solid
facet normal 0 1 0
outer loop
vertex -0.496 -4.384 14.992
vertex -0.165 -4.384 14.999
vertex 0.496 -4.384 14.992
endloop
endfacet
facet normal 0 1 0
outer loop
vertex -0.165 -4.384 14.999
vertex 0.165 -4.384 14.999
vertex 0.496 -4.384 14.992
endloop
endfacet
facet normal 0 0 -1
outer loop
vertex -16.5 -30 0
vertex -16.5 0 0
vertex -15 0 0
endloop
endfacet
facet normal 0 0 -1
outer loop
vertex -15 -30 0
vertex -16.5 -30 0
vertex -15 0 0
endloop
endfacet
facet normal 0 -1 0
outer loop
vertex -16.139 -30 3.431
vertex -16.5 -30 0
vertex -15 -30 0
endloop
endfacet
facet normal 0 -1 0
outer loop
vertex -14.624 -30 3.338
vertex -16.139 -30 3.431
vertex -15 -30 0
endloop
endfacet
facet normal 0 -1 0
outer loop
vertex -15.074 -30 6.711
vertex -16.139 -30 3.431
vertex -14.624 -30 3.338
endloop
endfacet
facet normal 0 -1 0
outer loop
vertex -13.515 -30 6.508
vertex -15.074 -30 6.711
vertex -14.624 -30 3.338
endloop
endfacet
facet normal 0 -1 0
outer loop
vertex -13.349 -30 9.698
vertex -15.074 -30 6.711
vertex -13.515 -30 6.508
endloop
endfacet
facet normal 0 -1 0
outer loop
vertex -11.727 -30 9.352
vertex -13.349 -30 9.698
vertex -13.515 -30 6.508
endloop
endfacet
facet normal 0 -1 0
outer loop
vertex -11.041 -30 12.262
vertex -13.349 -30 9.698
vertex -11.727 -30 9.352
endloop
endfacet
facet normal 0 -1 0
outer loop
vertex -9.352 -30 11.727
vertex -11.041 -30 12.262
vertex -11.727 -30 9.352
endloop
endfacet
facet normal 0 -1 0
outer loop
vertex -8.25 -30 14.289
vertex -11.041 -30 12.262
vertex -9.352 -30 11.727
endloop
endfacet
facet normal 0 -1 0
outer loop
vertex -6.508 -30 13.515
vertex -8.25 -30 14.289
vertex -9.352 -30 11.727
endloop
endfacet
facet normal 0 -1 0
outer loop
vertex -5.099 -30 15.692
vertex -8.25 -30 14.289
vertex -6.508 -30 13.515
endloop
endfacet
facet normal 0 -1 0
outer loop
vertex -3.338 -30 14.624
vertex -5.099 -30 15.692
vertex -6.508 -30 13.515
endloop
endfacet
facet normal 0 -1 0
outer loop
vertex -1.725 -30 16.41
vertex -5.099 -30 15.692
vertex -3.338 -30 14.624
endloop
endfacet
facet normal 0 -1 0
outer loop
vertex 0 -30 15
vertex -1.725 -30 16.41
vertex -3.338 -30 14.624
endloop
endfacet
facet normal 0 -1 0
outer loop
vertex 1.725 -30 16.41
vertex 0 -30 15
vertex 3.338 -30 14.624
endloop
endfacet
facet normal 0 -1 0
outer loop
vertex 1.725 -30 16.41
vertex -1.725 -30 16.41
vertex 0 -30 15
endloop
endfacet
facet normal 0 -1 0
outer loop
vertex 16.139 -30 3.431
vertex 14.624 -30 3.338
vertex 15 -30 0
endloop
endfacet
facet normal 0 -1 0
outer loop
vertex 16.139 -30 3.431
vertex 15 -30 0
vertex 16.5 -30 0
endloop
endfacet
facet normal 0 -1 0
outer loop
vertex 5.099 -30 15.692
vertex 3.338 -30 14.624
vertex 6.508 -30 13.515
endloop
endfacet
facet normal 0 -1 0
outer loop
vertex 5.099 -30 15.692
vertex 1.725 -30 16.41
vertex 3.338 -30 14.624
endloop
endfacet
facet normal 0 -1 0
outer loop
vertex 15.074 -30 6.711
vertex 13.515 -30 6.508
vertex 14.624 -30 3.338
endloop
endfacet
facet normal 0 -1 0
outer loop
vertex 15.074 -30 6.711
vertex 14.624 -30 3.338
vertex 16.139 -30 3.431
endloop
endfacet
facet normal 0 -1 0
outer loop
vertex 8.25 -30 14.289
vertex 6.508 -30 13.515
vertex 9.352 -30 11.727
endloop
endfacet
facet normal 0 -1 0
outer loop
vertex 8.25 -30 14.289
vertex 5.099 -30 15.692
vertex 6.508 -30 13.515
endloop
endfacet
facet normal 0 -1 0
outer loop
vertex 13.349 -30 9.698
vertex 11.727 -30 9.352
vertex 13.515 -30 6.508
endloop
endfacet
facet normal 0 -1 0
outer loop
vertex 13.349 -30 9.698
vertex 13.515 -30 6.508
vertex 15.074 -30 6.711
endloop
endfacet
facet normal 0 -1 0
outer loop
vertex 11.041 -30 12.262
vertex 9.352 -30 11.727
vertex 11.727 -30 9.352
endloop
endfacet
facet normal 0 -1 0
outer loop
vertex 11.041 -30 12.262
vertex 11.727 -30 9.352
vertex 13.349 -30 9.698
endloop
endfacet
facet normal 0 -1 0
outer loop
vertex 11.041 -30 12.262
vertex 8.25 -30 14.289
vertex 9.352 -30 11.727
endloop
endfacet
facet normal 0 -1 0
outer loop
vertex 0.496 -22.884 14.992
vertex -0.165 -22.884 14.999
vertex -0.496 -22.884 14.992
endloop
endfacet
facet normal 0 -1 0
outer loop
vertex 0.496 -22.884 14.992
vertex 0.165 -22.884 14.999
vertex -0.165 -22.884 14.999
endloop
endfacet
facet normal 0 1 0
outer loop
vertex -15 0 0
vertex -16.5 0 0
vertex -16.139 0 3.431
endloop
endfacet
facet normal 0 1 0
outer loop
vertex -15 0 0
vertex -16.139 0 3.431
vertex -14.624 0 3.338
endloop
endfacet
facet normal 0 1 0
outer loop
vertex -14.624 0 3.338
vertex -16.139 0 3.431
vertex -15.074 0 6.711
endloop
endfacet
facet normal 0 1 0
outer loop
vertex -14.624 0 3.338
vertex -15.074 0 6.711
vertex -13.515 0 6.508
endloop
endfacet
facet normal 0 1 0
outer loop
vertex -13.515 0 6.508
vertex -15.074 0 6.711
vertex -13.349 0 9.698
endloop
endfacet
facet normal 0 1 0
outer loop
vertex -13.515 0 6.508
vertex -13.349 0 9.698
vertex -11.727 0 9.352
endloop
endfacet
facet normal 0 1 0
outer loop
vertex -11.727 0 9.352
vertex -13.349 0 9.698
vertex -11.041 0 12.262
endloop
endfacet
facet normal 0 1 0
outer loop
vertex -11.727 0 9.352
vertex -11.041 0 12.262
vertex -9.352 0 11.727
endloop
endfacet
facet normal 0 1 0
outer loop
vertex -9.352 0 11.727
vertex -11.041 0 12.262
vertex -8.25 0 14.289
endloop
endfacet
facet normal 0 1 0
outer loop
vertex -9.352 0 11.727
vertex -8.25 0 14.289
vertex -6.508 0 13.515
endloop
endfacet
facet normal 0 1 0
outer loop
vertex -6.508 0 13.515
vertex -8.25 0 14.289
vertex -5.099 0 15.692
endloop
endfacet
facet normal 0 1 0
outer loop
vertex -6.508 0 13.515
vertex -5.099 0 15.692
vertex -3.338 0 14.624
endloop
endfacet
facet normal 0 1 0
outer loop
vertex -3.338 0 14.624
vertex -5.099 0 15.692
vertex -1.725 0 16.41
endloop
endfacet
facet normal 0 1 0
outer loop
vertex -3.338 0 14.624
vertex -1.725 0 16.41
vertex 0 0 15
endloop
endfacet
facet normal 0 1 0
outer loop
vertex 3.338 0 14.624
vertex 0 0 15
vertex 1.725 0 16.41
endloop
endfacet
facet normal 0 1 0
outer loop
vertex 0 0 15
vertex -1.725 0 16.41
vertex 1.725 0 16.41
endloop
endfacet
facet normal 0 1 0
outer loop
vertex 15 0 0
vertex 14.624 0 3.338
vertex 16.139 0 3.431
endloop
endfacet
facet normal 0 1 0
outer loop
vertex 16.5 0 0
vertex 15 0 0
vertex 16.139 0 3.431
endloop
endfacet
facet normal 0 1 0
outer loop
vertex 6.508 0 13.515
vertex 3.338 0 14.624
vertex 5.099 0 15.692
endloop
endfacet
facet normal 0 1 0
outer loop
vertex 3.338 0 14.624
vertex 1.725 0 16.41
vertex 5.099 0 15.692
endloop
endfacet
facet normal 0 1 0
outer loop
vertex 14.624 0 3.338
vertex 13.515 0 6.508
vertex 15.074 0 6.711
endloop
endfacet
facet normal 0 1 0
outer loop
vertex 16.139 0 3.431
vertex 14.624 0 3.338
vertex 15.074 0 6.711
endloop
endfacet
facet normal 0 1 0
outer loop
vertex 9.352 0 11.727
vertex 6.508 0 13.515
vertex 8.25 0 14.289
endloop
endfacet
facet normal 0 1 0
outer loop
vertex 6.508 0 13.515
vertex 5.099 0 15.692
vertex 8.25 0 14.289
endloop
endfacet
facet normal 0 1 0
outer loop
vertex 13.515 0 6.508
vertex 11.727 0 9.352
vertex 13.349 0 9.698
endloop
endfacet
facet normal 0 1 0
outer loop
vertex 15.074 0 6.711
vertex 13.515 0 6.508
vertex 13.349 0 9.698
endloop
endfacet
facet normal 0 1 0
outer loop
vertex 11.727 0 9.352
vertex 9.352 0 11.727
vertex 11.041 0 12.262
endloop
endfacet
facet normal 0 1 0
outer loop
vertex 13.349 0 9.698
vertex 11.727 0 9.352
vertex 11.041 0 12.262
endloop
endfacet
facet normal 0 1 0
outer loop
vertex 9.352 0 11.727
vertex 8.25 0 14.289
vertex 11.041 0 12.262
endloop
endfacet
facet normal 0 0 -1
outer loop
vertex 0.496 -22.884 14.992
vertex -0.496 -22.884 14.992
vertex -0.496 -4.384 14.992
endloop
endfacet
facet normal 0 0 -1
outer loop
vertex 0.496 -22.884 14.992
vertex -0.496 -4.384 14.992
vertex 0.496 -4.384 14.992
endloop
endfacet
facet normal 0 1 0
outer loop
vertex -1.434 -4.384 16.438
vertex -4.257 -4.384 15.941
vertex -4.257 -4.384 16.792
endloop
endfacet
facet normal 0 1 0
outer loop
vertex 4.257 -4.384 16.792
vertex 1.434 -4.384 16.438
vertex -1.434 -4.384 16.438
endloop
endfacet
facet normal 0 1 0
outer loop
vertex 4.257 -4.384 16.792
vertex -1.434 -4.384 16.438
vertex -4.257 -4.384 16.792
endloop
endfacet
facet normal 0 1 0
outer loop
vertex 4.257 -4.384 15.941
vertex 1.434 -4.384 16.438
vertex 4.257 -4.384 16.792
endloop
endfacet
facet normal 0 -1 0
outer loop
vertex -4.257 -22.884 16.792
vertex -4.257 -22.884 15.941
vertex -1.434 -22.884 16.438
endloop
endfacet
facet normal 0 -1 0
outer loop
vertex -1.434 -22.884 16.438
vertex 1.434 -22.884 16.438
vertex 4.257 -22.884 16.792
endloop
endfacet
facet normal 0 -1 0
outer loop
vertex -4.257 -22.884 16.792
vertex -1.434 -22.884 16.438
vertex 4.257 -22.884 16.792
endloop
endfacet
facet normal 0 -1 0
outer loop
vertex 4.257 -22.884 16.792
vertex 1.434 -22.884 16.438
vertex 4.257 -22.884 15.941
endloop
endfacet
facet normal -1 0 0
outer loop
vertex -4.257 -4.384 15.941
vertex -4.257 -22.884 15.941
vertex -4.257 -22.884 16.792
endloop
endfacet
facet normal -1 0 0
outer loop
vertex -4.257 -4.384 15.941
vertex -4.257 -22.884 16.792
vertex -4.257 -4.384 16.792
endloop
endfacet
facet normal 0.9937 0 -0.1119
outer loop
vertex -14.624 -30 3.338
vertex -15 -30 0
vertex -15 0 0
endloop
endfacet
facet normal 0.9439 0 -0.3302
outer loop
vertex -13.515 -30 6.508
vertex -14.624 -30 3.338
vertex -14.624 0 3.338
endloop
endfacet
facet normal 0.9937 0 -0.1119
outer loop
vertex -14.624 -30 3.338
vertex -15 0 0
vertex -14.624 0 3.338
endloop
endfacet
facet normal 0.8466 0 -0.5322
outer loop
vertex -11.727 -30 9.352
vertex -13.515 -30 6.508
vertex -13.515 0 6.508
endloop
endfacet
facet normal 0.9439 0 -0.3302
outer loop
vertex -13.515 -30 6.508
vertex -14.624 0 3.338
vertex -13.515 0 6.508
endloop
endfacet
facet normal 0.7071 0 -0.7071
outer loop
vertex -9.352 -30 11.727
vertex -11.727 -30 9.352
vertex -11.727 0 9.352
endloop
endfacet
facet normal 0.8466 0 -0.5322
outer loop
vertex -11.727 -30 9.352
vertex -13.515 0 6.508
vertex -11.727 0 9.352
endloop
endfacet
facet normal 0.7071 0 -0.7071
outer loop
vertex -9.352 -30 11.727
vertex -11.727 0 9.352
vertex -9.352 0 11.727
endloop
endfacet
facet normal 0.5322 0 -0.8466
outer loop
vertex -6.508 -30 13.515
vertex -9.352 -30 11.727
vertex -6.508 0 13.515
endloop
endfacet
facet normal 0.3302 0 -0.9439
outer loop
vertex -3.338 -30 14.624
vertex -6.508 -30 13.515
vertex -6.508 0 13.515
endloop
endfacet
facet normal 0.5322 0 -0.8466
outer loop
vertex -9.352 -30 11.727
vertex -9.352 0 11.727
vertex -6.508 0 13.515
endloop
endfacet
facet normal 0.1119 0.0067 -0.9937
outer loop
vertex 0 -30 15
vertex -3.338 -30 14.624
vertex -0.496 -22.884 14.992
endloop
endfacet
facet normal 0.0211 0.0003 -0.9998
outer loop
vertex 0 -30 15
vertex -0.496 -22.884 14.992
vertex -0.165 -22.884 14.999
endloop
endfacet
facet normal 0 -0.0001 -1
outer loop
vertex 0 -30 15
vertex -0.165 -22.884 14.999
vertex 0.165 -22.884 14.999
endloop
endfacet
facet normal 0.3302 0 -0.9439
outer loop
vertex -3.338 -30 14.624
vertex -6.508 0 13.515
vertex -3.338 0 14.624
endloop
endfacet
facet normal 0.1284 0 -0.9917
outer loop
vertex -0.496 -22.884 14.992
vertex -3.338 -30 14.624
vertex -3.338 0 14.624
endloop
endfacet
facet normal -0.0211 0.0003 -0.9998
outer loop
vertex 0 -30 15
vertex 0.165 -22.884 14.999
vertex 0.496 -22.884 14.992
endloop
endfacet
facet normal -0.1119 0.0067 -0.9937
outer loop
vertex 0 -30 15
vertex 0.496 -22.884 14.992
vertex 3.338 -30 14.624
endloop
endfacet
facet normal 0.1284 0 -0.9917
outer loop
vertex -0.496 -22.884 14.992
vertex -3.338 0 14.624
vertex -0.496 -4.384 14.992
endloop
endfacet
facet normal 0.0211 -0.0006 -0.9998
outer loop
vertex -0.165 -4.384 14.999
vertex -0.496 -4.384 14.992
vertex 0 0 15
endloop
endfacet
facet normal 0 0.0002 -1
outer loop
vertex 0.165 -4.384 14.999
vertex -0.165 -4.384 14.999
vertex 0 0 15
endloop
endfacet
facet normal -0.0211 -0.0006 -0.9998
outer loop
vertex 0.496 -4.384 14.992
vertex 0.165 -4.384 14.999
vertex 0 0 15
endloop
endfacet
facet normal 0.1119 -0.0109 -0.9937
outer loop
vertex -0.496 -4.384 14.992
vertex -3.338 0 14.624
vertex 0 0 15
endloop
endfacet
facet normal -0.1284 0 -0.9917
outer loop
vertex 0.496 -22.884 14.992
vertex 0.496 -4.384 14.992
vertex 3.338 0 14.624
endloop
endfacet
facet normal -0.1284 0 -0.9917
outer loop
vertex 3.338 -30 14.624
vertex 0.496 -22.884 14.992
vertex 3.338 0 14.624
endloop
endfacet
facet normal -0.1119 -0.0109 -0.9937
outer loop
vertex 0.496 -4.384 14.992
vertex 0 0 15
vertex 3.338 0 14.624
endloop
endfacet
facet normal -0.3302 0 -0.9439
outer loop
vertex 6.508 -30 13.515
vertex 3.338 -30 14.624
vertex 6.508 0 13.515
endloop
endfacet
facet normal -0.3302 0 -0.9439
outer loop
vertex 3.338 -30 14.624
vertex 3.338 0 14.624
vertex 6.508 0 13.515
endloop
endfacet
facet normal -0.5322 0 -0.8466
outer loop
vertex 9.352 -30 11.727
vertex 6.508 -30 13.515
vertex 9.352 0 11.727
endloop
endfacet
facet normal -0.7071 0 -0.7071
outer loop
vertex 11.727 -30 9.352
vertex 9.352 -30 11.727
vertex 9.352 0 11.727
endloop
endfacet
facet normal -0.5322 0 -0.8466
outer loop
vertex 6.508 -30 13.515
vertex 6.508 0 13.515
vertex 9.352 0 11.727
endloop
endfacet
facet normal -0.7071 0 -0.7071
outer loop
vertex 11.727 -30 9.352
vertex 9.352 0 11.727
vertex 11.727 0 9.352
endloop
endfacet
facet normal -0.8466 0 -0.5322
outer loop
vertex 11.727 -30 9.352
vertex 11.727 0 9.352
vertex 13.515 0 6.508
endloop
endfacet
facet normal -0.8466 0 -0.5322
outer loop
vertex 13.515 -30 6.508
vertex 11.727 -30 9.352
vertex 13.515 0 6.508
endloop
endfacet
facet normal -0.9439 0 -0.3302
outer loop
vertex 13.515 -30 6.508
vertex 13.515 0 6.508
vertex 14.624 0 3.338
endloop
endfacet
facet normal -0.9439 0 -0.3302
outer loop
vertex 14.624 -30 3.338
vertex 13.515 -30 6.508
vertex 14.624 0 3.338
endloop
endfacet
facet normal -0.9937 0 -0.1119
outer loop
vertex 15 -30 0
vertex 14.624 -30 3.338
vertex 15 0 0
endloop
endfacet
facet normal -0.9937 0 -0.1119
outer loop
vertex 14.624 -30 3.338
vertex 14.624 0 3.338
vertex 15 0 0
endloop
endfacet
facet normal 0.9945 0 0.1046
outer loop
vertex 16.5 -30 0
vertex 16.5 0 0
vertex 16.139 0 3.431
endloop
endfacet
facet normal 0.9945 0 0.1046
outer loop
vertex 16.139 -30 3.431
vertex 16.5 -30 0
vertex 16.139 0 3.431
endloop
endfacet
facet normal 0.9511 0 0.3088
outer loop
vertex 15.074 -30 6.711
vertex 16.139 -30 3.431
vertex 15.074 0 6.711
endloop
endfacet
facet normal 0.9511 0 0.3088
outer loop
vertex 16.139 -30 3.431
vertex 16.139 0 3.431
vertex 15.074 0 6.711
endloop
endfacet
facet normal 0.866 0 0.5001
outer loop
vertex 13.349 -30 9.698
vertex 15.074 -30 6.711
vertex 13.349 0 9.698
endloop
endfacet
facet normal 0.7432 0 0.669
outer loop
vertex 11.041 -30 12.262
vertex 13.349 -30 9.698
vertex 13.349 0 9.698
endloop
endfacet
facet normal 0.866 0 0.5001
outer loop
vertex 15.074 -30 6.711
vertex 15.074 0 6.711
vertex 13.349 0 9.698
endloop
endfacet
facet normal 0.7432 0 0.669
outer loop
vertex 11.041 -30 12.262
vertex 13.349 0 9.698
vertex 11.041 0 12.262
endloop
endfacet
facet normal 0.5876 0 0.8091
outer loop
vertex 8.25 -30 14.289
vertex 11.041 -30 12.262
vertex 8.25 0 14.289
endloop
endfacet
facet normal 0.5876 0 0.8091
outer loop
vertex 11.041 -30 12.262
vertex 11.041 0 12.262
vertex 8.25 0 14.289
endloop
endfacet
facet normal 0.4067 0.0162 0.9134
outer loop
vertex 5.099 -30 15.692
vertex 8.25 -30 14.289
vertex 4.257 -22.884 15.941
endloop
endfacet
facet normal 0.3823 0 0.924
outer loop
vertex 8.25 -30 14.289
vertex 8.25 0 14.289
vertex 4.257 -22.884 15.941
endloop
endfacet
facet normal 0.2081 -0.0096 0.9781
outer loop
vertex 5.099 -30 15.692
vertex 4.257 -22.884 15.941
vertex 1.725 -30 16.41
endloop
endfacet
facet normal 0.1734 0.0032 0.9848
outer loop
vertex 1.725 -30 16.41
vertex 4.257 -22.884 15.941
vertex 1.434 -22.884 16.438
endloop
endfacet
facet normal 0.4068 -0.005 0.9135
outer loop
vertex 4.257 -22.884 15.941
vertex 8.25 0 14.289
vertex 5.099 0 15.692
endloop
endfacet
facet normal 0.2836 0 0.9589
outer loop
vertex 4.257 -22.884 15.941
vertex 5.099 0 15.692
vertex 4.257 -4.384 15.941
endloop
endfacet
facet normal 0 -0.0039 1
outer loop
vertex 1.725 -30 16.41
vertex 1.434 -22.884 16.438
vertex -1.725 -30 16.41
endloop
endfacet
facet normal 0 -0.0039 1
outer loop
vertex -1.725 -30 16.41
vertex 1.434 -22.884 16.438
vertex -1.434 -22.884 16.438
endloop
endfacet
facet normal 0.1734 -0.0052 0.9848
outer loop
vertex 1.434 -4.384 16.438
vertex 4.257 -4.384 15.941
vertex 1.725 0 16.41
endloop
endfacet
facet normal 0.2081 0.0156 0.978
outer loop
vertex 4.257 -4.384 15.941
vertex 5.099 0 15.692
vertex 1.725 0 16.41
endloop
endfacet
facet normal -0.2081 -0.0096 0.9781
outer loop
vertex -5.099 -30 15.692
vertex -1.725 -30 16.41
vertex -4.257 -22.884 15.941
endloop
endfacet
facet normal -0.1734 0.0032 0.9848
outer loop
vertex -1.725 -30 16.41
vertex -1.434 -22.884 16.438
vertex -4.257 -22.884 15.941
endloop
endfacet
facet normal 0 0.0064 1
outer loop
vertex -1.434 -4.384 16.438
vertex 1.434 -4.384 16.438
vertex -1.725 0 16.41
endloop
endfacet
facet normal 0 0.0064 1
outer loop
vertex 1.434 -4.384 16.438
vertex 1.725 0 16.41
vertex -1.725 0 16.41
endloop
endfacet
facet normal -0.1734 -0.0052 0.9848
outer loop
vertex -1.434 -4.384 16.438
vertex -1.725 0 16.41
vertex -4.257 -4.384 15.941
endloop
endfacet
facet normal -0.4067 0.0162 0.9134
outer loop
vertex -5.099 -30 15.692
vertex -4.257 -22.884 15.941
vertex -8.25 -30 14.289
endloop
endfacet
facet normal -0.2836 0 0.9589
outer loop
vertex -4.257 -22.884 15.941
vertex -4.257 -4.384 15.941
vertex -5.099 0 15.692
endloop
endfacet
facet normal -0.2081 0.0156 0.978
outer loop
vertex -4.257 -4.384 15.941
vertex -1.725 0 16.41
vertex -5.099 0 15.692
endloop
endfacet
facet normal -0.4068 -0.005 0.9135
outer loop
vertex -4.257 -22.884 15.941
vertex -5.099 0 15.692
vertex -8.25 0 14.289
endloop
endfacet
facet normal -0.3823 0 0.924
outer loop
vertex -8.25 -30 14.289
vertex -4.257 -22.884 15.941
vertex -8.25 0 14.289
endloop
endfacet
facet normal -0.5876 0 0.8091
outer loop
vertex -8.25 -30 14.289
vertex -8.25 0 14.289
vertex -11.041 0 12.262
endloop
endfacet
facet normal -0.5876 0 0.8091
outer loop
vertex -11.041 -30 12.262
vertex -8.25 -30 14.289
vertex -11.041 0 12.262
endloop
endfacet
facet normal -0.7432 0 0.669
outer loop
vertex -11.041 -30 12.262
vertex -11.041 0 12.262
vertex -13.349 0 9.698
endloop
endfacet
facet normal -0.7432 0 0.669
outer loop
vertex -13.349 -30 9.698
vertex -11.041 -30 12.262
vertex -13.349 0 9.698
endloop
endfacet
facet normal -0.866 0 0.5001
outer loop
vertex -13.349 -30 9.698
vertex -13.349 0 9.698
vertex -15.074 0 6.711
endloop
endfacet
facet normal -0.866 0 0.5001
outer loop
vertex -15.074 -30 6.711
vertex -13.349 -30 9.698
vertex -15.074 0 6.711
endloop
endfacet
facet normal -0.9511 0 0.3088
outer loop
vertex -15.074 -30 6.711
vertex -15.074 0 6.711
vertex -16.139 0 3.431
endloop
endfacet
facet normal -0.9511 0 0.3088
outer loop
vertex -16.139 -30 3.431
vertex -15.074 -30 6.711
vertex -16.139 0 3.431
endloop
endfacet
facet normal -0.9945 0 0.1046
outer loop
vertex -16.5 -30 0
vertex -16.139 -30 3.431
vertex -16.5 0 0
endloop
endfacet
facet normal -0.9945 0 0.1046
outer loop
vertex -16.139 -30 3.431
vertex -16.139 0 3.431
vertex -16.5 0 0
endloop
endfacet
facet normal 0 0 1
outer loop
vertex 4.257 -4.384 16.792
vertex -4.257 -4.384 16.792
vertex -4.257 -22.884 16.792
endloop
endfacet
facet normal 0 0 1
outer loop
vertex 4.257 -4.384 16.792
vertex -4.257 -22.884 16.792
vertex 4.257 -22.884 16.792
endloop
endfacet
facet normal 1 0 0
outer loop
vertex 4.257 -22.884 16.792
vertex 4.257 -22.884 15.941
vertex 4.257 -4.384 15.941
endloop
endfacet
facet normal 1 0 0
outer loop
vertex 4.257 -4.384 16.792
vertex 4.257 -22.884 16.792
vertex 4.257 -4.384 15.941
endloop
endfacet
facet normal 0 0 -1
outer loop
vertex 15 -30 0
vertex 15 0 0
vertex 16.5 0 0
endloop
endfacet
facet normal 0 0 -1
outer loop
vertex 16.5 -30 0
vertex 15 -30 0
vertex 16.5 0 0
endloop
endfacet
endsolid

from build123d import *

# Parameters (mm, degrees)
F1_DEPTH = 30
F4_W     = 8.514822
F4_H     = 18.499203
F5_DEPTH = 1
F6_W     = 8.514822
F6_H     = 18.499203
F7_DEPTH = 1.8


with BuildPart() as f1:
    # F0 (on Front) → F1 (new body)
    with BuildSketch(Plane.XZ):
        with BuildLine():
            ThreePointArc((-15, 0), (0, 15), (15, 0))
            Line((15, 0), (16.5, 0))
            ThreePointArc((16.5, 0), (0, 16.5), (-16.5, 0))
            Line((-16.5, 0), (-15, 0))
        make_face()
    extrude(amount=F1_DEPTH)



with BuildPart() as f5:
    # F4 (on face) → F5 (new body)
    with BuildSketch(Plane.XY.offset(15.791785)):
        with Locations((0, -13.633903)):
            Rectangle(F4_W, F4_H)
    extrude(amount=F5_DEPTH)


with BuildPart() as f1_1:
    add(f1.part)

    add(f5.part)  # F7 merges F5
    # F6 (on face) → F7 (join)
    with BuildSketch(Plane.XY.offset(16.791785)):
        with Locations((0, -13.633903)):
            Rectangle(F6_W, F6_H)
    extrude(amount=-F7_DEPTH)


solid = f1_1.part
